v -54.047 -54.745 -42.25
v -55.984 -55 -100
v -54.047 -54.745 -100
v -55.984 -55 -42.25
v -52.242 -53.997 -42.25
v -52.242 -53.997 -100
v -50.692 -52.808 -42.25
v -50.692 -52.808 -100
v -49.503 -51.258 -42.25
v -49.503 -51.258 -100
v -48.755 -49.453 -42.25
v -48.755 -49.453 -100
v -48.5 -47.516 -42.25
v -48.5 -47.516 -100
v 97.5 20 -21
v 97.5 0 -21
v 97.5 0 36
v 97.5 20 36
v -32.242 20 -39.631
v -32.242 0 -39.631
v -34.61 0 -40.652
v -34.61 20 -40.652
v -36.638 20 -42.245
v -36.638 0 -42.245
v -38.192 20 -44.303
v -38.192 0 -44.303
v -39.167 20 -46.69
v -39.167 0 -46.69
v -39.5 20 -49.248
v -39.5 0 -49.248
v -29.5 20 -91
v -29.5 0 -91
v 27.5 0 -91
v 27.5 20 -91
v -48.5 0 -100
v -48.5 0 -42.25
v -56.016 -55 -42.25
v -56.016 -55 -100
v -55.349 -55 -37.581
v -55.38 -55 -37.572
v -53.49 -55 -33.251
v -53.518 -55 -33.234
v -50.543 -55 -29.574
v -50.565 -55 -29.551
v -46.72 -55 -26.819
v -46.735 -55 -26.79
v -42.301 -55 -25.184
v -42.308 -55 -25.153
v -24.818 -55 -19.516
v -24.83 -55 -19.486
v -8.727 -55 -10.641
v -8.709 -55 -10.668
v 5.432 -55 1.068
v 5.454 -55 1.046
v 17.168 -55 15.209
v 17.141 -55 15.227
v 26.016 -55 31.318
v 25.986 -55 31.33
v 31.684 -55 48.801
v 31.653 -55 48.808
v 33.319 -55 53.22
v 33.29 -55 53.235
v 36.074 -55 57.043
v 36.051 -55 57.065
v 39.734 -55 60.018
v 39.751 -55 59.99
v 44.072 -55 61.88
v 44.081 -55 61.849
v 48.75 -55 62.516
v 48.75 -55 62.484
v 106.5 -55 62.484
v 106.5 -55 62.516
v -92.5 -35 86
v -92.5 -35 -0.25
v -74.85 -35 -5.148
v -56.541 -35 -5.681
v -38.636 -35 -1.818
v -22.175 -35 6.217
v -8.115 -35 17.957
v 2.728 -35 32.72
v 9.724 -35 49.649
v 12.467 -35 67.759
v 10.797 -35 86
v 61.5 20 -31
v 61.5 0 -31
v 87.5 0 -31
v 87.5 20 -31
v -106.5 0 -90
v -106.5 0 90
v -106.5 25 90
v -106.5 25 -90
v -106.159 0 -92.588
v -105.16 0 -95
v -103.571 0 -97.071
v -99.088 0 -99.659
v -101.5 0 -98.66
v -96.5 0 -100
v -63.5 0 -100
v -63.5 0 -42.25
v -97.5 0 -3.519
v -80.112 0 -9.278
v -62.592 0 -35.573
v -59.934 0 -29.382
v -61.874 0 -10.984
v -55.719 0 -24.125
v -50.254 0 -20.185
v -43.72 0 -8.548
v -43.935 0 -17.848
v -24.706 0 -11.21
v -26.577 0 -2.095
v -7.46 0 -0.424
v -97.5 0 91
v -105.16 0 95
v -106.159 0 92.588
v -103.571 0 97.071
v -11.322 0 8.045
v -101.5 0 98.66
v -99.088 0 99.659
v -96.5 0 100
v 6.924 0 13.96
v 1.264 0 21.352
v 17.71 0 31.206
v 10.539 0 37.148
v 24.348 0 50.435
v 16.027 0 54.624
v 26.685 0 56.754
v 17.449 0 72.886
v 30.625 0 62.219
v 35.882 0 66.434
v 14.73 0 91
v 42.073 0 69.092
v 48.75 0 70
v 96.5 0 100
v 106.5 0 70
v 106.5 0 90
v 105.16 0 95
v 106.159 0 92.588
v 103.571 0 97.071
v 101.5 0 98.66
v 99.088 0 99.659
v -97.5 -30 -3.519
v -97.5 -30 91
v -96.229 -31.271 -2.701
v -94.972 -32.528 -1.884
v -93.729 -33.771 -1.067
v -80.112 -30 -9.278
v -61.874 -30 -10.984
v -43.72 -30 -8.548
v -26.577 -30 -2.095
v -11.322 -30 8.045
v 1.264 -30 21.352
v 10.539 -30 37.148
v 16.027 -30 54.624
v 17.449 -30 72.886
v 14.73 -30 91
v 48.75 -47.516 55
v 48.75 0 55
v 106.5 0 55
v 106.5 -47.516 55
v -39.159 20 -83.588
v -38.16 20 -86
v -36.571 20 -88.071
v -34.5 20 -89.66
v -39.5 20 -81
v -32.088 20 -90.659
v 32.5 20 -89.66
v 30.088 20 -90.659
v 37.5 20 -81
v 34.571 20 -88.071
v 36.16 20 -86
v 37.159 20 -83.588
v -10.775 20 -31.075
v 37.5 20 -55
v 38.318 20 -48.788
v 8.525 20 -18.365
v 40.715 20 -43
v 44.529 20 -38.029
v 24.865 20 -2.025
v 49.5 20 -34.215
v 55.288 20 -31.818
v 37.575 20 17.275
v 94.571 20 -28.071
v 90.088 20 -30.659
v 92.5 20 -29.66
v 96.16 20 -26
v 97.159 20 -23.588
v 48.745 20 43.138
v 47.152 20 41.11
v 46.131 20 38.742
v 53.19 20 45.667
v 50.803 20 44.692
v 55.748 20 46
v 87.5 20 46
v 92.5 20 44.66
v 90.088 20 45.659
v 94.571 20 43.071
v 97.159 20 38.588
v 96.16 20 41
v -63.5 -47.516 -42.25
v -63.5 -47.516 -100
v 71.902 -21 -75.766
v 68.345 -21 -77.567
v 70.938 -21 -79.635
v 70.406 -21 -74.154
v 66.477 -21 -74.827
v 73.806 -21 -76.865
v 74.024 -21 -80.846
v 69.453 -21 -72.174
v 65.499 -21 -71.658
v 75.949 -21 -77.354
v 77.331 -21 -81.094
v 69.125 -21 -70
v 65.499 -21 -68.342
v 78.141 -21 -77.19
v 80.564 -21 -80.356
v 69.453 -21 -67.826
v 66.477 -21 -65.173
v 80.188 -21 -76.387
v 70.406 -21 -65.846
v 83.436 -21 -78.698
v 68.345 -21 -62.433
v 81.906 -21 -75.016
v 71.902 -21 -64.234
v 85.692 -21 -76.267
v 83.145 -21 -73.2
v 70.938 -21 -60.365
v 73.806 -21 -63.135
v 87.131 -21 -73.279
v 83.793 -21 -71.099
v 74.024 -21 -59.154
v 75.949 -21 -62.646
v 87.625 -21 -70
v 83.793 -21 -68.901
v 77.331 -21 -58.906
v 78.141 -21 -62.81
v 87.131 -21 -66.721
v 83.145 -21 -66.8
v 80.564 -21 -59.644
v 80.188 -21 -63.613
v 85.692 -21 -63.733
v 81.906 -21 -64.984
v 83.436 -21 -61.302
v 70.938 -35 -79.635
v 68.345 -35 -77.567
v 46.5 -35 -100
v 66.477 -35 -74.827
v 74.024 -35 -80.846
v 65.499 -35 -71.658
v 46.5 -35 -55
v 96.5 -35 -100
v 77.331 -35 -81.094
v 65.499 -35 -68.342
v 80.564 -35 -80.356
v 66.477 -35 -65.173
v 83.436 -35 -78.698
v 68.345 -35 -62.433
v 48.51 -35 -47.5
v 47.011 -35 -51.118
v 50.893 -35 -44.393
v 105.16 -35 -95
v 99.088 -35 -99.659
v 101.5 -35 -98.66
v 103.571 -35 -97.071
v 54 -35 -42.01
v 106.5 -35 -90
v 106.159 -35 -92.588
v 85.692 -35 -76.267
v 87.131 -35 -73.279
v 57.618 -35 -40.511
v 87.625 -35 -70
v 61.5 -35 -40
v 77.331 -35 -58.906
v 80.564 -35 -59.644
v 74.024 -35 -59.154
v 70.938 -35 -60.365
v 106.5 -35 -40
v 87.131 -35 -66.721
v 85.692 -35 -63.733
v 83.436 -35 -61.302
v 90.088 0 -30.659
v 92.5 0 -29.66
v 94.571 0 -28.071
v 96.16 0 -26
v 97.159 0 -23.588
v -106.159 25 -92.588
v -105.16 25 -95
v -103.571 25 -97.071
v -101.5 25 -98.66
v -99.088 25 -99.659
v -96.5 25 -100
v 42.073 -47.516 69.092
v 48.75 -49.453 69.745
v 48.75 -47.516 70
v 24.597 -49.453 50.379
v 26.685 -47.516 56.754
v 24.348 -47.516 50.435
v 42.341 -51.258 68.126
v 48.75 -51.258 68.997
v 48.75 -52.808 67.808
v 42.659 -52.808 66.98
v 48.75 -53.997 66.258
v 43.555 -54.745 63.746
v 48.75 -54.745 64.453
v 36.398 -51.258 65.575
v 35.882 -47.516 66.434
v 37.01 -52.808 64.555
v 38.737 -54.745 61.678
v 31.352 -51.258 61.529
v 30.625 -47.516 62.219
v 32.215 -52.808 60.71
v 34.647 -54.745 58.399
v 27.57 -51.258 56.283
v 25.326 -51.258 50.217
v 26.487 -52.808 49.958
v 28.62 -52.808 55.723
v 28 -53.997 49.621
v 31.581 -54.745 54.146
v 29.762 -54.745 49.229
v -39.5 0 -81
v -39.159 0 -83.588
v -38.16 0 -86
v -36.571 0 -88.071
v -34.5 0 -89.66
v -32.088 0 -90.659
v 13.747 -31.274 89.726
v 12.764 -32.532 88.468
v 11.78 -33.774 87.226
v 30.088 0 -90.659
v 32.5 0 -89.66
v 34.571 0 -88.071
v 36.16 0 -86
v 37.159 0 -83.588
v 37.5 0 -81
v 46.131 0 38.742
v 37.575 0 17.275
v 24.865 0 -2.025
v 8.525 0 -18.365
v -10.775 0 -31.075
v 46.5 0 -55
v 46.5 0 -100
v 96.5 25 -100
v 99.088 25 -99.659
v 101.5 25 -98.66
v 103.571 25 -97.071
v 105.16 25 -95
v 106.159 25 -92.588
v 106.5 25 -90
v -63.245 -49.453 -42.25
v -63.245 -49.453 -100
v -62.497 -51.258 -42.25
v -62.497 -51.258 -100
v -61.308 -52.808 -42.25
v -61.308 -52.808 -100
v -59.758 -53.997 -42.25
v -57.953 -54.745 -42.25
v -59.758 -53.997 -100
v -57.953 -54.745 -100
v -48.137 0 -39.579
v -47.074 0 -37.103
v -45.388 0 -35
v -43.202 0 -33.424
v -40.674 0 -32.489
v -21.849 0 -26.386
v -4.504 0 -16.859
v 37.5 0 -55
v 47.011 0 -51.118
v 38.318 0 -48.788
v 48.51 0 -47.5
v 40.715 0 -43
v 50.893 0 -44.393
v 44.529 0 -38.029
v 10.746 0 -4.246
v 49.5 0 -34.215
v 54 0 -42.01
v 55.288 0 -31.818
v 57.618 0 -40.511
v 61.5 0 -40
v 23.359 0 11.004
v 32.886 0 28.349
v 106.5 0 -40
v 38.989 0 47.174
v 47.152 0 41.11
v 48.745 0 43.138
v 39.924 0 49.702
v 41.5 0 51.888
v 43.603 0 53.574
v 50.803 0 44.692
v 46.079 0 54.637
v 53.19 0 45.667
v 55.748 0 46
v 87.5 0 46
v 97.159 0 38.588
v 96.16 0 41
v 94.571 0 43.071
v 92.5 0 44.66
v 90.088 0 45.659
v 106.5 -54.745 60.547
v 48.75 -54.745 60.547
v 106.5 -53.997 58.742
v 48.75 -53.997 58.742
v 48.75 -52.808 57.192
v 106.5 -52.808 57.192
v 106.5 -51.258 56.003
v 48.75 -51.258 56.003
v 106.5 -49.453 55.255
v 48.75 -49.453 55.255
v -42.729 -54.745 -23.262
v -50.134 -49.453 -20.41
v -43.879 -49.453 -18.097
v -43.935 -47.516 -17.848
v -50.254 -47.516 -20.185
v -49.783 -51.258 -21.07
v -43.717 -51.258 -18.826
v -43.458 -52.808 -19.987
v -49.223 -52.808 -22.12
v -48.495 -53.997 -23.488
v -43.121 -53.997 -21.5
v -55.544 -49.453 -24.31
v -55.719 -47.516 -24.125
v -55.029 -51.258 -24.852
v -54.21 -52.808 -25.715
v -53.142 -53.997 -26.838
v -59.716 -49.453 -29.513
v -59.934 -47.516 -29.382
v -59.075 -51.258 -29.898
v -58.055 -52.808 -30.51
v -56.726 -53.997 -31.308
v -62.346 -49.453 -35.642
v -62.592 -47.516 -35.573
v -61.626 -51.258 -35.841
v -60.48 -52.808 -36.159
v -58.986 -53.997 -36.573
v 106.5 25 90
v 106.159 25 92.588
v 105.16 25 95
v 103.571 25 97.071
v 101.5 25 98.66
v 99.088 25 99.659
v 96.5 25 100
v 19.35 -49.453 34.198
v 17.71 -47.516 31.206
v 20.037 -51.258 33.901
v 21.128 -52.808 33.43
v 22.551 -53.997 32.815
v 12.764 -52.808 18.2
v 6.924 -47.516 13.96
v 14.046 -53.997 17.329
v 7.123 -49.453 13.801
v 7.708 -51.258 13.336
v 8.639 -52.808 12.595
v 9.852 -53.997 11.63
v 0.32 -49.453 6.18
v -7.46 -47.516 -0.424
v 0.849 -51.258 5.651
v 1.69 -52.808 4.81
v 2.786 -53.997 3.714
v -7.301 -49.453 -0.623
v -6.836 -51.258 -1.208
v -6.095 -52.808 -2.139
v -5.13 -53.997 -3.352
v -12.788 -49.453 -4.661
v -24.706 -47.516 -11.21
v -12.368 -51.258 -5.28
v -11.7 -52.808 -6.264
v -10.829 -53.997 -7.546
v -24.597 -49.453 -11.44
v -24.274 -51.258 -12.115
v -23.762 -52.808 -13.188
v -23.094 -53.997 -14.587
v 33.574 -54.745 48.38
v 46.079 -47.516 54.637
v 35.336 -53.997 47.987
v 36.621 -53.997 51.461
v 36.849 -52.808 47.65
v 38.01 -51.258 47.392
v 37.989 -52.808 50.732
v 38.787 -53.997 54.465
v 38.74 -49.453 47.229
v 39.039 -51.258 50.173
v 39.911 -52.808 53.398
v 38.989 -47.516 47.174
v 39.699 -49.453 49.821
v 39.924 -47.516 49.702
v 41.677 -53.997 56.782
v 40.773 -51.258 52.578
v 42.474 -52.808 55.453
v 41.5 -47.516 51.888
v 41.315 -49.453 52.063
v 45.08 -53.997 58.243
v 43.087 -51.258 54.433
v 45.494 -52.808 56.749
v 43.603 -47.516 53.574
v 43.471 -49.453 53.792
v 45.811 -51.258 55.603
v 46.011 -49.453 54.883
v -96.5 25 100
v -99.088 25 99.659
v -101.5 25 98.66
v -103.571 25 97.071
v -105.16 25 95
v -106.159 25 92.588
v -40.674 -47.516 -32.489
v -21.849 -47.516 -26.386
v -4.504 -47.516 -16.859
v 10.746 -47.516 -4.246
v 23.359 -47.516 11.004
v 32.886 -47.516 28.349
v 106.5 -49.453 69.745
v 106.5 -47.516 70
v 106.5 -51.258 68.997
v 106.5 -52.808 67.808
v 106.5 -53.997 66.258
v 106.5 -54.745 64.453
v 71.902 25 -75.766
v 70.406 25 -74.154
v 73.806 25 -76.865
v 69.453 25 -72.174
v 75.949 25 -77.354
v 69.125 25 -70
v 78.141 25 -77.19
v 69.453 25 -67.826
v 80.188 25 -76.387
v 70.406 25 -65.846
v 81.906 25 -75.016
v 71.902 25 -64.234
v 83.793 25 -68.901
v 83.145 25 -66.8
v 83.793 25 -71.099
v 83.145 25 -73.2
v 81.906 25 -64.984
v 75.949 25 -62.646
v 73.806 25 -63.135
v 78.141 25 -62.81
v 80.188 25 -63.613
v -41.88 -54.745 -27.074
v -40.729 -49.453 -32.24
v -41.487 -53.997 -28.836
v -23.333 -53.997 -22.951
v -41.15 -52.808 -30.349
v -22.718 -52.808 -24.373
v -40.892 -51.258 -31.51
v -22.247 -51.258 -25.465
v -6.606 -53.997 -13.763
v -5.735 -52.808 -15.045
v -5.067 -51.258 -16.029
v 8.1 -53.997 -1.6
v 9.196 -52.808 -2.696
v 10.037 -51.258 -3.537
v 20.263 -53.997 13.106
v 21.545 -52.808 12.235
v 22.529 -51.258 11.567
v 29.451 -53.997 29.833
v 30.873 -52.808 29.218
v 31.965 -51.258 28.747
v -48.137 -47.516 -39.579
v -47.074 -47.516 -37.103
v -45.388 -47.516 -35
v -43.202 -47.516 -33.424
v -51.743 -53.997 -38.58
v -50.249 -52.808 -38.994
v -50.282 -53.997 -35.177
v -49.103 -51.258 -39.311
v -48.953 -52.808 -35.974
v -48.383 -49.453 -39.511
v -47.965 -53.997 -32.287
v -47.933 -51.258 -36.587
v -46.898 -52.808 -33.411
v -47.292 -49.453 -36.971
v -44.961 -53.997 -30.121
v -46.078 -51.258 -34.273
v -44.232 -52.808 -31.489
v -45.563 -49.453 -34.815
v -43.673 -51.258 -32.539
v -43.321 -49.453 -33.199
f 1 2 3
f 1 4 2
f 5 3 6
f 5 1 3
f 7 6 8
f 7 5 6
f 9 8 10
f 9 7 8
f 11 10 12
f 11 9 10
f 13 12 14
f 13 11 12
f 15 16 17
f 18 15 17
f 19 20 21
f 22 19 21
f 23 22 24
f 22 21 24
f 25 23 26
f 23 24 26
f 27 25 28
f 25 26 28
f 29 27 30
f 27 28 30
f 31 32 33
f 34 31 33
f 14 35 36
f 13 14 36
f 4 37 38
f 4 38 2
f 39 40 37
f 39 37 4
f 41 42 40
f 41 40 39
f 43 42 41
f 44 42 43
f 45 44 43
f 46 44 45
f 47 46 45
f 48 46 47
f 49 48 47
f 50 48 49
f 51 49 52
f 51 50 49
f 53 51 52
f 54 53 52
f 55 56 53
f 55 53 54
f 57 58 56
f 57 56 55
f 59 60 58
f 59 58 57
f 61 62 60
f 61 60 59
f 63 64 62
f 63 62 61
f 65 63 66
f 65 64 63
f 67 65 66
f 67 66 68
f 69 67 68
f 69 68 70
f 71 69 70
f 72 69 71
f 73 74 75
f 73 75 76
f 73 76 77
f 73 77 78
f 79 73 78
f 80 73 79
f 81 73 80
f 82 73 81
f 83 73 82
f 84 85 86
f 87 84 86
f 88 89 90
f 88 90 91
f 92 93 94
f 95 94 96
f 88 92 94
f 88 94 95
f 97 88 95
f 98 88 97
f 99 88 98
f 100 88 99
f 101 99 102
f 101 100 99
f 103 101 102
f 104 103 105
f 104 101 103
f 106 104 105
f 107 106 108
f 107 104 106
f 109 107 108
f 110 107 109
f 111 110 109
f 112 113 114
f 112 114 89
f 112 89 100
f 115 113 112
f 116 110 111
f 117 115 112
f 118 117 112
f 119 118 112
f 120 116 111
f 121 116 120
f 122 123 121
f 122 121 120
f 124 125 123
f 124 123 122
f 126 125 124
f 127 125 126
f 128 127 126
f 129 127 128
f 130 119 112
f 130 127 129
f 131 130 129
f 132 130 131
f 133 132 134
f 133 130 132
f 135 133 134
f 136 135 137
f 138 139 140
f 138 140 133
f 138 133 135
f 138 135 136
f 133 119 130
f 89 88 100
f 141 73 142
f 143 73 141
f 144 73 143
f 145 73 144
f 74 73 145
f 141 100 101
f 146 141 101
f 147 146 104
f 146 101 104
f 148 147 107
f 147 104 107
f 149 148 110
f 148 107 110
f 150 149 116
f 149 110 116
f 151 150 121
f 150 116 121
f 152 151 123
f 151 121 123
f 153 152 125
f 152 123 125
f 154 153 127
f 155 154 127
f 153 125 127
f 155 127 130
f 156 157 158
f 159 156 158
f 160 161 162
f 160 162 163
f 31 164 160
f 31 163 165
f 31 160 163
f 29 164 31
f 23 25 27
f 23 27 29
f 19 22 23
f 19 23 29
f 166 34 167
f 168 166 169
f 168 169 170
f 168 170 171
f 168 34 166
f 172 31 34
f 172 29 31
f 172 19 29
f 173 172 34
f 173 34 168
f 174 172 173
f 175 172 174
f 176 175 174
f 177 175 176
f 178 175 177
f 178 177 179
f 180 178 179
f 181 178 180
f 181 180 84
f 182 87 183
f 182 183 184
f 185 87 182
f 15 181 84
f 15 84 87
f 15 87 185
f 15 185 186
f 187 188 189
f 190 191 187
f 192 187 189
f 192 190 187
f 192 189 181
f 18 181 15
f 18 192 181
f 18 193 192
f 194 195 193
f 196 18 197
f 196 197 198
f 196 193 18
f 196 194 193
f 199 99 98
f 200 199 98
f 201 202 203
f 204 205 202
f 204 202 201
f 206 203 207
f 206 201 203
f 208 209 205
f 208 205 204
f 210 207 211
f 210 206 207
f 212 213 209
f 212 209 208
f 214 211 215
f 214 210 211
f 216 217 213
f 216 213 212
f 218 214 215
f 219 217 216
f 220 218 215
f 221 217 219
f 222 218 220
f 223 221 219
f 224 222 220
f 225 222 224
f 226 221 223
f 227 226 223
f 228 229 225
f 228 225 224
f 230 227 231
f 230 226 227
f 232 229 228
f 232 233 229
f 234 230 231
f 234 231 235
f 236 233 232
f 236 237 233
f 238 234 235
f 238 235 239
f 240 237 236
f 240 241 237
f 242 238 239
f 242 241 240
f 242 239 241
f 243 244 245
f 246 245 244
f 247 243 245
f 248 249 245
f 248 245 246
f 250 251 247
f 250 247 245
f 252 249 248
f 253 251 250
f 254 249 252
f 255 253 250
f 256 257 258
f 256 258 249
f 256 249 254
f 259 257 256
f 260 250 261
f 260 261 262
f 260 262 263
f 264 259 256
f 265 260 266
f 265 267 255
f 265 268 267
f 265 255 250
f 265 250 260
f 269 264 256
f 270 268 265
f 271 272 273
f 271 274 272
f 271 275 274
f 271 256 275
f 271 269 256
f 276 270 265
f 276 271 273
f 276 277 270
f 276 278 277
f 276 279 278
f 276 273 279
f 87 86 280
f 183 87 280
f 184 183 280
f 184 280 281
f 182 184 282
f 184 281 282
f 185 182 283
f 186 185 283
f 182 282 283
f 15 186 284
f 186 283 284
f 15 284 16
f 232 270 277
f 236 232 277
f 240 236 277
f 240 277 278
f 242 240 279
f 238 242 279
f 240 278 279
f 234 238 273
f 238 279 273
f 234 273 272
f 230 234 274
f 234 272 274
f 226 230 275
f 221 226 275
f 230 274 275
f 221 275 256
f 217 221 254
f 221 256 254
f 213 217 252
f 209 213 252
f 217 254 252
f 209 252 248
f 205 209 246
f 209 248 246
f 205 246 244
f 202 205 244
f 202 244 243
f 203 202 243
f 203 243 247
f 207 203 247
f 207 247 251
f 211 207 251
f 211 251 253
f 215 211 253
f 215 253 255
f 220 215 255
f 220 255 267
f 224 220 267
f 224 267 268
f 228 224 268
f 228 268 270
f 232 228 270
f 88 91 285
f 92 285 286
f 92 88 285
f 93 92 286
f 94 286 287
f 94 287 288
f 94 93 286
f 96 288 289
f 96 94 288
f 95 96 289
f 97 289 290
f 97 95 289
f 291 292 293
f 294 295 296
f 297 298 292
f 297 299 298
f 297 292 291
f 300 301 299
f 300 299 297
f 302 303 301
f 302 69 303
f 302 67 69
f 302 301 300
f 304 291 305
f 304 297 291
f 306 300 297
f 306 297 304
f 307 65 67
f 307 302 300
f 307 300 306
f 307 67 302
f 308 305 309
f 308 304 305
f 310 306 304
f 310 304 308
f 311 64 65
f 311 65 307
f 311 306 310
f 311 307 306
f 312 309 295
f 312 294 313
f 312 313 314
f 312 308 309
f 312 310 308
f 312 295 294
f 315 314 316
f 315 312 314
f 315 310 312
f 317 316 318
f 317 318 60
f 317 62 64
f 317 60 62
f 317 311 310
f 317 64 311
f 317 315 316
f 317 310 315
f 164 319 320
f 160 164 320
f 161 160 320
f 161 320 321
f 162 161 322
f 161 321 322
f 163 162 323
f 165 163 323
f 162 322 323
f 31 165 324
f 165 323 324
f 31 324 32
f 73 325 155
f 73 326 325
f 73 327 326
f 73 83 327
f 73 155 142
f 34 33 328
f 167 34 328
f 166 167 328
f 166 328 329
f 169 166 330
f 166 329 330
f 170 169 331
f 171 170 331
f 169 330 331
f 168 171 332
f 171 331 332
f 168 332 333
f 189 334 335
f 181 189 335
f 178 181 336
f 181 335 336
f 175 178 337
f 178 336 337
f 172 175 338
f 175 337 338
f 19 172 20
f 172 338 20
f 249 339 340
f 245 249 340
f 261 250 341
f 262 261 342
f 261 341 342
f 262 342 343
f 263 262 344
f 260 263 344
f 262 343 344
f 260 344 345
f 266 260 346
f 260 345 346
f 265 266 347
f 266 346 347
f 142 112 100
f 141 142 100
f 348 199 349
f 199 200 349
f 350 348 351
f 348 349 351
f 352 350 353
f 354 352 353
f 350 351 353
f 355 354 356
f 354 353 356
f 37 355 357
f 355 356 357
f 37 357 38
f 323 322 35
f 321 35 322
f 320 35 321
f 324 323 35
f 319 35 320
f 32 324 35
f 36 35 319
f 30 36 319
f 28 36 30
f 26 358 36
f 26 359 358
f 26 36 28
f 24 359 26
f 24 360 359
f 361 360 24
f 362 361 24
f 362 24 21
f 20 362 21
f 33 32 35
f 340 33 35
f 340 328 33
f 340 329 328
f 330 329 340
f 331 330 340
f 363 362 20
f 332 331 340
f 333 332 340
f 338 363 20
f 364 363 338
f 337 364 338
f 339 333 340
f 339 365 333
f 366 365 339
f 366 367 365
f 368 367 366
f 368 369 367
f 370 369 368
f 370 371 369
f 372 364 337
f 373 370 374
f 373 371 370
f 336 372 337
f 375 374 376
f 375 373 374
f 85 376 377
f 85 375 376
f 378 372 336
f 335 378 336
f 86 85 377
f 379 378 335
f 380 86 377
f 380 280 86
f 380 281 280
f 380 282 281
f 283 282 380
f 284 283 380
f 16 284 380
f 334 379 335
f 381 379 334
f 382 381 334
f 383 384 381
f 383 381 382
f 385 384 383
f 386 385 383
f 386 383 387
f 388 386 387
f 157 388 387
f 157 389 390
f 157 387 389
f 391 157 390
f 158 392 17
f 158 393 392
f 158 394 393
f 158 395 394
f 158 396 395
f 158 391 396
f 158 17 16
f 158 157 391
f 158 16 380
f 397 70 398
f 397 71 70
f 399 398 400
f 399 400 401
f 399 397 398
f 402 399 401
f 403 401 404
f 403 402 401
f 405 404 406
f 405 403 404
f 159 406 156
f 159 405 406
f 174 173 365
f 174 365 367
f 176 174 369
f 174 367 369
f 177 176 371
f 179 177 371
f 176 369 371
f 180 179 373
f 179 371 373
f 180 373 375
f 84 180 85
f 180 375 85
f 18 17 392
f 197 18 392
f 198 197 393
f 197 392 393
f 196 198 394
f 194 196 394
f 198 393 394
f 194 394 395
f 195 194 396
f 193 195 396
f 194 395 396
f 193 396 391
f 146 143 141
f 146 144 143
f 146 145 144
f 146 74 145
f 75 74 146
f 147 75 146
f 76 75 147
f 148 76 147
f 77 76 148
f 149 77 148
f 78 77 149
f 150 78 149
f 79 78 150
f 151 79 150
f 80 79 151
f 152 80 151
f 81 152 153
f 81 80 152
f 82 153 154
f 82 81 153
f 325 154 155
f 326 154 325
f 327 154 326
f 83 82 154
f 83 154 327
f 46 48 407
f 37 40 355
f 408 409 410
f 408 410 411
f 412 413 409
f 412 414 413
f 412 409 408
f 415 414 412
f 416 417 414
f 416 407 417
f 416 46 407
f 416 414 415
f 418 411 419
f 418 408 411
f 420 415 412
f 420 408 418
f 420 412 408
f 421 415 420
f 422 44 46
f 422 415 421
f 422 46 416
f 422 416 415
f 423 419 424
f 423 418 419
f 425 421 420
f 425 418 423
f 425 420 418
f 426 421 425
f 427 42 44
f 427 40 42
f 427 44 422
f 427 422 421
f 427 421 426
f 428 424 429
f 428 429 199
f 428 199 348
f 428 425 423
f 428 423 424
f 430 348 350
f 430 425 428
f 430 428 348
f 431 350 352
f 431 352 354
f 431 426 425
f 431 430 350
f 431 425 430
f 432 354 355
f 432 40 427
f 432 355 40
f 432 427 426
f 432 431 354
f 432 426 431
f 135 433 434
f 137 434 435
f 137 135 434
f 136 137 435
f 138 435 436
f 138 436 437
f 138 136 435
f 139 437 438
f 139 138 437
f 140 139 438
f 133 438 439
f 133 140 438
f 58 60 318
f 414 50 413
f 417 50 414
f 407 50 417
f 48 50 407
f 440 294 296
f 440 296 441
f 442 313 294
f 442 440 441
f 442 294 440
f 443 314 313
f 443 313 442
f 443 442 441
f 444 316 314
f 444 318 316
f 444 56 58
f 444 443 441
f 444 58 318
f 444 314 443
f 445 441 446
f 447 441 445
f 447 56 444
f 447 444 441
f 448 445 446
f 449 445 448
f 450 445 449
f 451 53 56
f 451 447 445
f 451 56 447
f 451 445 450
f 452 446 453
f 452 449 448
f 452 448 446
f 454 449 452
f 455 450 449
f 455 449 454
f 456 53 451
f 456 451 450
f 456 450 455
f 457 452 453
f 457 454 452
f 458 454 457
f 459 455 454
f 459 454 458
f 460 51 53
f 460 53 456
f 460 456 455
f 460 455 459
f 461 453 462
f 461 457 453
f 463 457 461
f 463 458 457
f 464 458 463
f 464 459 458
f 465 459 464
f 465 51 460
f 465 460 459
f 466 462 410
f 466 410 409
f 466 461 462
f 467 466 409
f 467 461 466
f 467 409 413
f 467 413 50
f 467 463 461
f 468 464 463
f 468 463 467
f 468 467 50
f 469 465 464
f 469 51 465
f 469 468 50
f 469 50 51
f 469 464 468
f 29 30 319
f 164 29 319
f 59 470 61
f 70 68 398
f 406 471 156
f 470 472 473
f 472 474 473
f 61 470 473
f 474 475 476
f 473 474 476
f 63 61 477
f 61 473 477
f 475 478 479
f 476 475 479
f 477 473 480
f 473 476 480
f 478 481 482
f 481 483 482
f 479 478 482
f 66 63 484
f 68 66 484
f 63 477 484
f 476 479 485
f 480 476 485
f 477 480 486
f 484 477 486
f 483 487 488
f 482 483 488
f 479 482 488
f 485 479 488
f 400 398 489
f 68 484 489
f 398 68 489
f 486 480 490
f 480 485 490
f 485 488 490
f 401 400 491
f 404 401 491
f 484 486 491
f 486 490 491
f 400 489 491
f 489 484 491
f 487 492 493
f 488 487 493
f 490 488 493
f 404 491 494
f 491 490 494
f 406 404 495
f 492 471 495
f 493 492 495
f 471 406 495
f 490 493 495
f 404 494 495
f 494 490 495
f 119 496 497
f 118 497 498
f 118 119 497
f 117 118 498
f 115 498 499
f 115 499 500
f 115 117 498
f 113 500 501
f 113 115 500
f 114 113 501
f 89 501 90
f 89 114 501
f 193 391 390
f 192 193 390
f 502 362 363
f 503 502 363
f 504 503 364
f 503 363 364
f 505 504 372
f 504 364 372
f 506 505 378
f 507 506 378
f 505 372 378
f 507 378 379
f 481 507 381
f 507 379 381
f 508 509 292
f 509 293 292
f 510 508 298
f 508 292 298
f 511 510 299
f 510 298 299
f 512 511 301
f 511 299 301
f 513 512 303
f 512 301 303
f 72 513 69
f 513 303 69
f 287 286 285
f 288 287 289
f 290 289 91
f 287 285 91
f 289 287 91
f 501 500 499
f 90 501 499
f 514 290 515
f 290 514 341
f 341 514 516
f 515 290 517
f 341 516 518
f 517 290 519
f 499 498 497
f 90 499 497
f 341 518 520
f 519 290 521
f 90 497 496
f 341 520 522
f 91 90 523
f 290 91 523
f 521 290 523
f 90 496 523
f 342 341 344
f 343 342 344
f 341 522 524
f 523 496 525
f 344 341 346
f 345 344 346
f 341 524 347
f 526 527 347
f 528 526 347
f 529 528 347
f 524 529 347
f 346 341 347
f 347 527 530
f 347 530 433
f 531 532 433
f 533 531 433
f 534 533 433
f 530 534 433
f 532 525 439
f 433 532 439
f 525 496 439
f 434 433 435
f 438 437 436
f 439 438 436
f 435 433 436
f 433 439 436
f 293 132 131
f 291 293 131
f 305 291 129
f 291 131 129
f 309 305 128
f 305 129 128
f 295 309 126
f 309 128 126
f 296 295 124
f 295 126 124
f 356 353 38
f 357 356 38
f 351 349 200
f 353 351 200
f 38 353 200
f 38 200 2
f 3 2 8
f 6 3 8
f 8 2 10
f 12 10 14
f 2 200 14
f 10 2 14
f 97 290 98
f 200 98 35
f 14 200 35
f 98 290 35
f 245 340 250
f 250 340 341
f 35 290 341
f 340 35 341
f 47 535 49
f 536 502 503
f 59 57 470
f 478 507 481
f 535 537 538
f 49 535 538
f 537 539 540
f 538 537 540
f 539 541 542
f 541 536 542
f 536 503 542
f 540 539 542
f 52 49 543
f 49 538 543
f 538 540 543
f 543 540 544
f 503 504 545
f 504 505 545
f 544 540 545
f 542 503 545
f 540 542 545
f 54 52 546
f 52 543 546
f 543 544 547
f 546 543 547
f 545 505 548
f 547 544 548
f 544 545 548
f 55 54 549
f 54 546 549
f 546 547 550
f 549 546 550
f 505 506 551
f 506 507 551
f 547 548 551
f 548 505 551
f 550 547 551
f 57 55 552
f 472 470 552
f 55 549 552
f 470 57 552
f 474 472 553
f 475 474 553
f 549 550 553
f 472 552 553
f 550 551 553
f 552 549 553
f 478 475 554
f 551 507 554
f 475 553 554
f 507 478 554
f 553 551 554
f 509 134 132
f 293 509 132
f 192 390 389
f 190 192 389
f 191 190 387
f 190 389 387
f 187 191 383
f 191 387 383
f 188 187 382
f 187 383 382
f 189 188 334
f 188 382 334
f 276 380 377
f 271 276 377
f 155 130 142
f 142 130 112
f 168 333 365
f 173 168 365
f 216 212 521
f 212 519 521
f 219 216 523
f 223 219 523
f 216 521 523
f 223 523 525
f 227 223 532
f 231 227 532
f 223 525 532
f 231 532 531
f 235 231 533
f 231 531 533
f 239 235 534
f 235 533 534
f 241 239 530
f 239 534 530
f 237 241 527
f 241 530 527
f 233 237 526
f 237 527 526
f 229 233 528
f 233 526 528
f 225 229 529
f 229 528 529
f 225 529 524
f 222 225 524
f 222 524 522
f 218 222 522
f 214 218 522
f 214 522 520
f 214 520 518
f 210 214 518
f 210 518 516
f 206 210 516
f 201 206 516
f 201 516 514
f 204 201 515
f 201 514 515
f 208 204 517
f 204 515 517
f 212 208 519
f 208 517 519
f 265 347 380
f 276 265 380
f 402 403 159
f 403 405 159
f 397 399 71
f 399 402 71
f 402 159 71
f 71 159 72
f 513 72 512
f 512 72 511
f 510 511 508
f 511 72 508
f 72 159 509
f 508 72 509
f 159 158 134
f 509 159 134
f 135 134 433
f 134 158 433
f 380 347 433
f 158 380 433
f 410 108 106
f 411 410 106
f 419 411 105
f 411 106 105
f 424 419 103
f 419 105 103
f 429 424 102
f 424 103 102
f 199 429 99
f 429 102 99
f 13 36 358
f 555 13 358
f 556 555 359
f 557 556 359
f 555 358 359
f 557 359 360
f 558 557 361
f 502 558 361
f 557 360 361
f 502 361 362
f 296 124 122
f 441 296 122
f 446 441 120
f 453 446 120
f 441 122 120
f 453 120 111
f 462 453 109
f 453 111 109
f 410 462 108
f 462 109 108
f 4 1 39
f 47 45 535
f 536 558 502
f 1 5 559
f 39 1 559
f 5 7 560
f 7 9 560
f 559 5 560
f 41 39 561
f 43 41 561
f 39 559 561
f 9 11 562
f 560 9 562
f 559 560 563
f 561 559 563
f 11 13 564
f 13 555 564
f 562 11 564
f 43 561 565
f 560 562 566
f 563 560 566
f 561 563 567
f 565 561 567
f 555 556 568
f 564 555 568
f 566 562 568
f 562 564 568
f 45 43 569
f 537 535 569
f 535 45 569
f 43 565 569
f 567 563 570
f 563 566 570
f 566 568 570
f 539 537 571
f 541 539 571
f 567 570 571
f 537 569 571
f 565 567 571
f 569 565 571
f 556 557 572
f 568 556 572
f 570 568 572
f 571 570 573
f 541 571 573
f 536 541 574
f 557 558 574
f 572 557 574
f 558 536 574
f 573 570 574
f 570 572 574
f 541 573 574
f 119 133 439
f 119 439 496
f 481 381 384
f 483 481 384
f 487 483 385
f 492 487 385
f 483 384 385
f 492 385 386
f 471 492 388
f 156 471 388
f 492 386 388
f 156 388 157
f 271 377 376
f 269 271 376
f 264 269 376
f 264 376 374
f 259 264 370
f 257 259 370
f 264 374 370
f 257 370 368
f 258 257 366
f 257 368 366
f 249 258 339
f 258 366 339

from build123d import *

# Parameters (mm, degrees)
F1_DEPTH       = 25
F2_DEPTH       = 35
F3_DEPTH       = 55
F4_DEPTH       = 20
F5_SIZE2       = 5
F5_SIZE        = 5
F7_D           = 14.75
F7_CBORE_D     = 22.25
F7_CBORE_DEPTH = 14
F8_R           = 7.4840620434


with BuildPart() as f1:
    # F0 (on Front) → F1 (new body)
    with BuildSketch(Plane.XZ):
        with BuildLine():
            Line((106.5, -40), (106.5, 55))
            Line((106.5, 55), (48.7497216032, 55))
            ThreePointArc((48.7497216032, 55), (42.4942891815, 52.8018949761), (38.9888762464, 47.1739130435))
            ThreePointArc((38.9888762464, 47.1739130435), (10.7462120246, -4.2462120246), (-40.6739130435, -32.4888762464))
            ThreePointArc((-40.6739130435, -32.4888762464), (-46.3018949761, -35.9942891815), (-48.5, -42.2497216032))
            Line((-48.5, -42.2497216032), (-48.5, -100))
            Line((-48.5, -100), (46.5, -100))
            Line((46.5, -100), (46.5, -55))
            ThreePointArc((46.5, -55), (50.8933982822, -44.3933982822), (61.5, -40))
            Line((61.5, -40), (106.5, -40))
        make_face()
        with BuildLine():
            ThreePointArc((-29.5, -91), (-36.5710678119, -88.0710678119), (-39.5, -81))
            Line((-39.5, -81), (-39.5, -49.2476414861))
            ThreePointArc((-39.5, -49.2476414861), (-37.481834214, -43.2234965193), (-32.2419354839, -39.630896205))
            ThreePointArc((-32.2419354839, -39.630896205), (17.1101730553, -10.6101730553), (46.130896205, 38.7419354839))
            ThreePointArc((46.130896205, 38.7419354839), (49.7234965193, 43.981834214), (55.7476414861, 46))
            Line((55.7476414861, 46), (87.5, 46))
            ThreePointArc((87.5, 46), (94.5710678119, 43.0710678119), (97.5, 36))
            Line((97.5, 36), (97.5, -21))
            ThreePointArc((97.5, -21), (94.5710678119, -28.0710678119), (87.5, -31))
            Line((87.5, -31), (61.5, -31))
            ThreePointArc((61.5, -31), (44.5294372515, -38.0294372515), (37.5, -55))
            Line((37.5, -55), (37.5, -81))
            ThreePointArc((37.5, -81), (34.5710678119, -88.0710678119), (27.5, -91))
            Line((27.5, -91), (-29.5, -91))
        make_face(mode=Mode.SUBTRACT)
        with BuildLine():
            Line((96.5, 100), (-96.5, 100))
            ThreePointArc((-96.5, 100), (-103.5710678119, 97.0710678119), (-106.5, 90))
            Line((-106.5, 90), (-106.5, -90))
            ThreePointArc((-106.5, -90), (-103.5710678119, -97.0710678119), (-96.5, -100))
            Line((-96.5, -100), (-63.5, -100))
            Line((-63.5, -100), (-63.5, -42.2497216032))
            ThreePointArc((-63.5, -42.2497216032), (-58.0047374401, -26.6111405489), (-43.9347826087, -17.8476082112))
            ThreePointArc((-43.9347826087, -17.8476082112), (0.1396103068, 6.3603896932), (24.3476082112, 50.4347826087))
            ThreePointArc((24.3476082112, 50.4347826087), (33.1111405489, 64.5047374401), (48.7497216032, 70))
            Line((48.7497216032, 70), (106.5, 70))
            Line((106.5, 70), (106.5, 90))
            ThreePointArc((106.5, 90), (103.5710678119, 97.0710678119), (96.5, 100))
        make_face()
        with BuildLine():
            ThreePointArc((14.7304288624, 91), (-11.3221396288, 8.044605666), (-97.5, -3.5187051029))
            Line((-97.5, -3.5187051029), (-97.5, 91))
            Line((-97.5, 91), (14.7304288624, 91))
        make_face(mode=Mode.SUBTRACT)
        with BuildLine():
            Line((-97.5, 91), (-97.5, -3.5187051029))
            ThreePointArc((-97.5, -3.5187051029), (-11.3221396288, 8.044605666), (14.7304288624, 91))
            Line((14.7304288624, 91), (-97.5, 91))
        make_face()
        with BuildLine():
            Line((-39.5, -49.2476414861), (-39.5, -81))
            ThreePointArc((-39.5, -81), (-36.5710678119, -88.0710678119), (-29.5, -91))
            Line((-29.5, -91), (27.5, -91))
            ThreePointArc((27.5, -91), (34.5710678119, -88.0710678119), (37.5, -81))
            Line((37.5, -81), (37.5, -55))
            ThreePointArc((37.5, -55), (44.5294372515, -38.0294372515), (61.5, -31))
            Line((61.5, -31), (87.5, -31))
            ThreePointArc((87.5, -31), (94.5710678119, -28.0710678119), (97.5, -21))
            Line((97.5, -21), (97.5, 36))
            ThreePointArc((97.5, 36), (94.5710678119, 43.0710678119), (87.5, 46))
            Line((87.5, 46), (55.7476414861, 46))
            ThreePointArc((55.7476414861, 46), (49.7234965193, 43.981834214), (46.130896205, 38.7419354839))
            ThreePointArc((46.130896205, 38.7419354839), (17.1101730553, -10.6101730553), (-32.2419354839, -39.630896205))
            ThreePointArc((-32.2419354839, -39.630896205), (-37.481834214, -43.2234965193), (-39.5, -49.2476414861))
        make_face()
        with BuildLine():
            Line((106.5, 55), (106.5, 70))
            Line((106.5, 70), (48.7497216032, 70))
            ThreePointArc((48.7497216032, 70), (33.1111405489, 64.5047374401), (24.3476082112, 50.4347826087))
            ThreePointArc((24.3476082112, 50.4347826087), (0.1396103068, 6.3603896932), (-43.9347826087, -17.8476082112))
            ThreePointArc((-43.9347826087, -17.8476082112), (-58.0047374401, -26.6111405489), (-63.5, -42.2497216032))
            Line((-63.5, -42.2497216032), (-63.5, -100))
            Line((-63.5, -100), (-48.5, -100))
            Line((-48.5, -100), (-48.5, -42.2497216032))
            ThreePointArc((-48.5, -42.2497216032), (-46.3018949761, -35.9942891815), (-40.6739130435, -32.4888762464))
            ThreePointArc((-40.6739130435, -32.4888762464), (10.7462120246, -4.2462120246), (38.9888762464, 47.1739130435))
            ThreePointArc((38.9888762464, 47.1739130435), (42.4942891815, 52.8018949761), (48.7497216032, 55))
            Line((48.7497216032, 55), (106.5, 55))
        make_face()
        with BuildLine():
            Line((106.5, -90), (106.5, -40))
            Line((106.5, -40), (61.5, -40))
            ThreePointArc((61.5, -40), (50.8933982822, -44.3933982822), (46.5, -55))
            Line((46.5, -55), (46.5, -100))
            Line((46.5, -100), (96.5, -100))
            ThreePointArc((96.5, -100), (103.5710678119, -97.0710678119), (106.5, -90))
        make_face()
    extrude(amount=-F1_DEPTH)

    # F0 (on Front) → F2 (join)
    with BuildSketch(Plane.XZ):
        with BuildLine():
            Line((-97.5, 91), (-97.5, -3.5187051029))
            ThreePointArc((-97.5, -3.5187051029), (-11.3221396288, 8.044605666), (14.7304288624, 91))
            Line((14.7304288624, 91), (-97.5, 91))
        make_face()
        with BuildLine():
            Line((106.5, -90), (106.5, -40))
            Line((106.5, -40), (61.5, -40))
            ThreePointArc((61.5, -40), (50.8933982822, -44.3933982822), (46.5, -55))
            Line((46.5, -55), (46.5, -100))
            Line((46.5, -100), (96.5, -100))
            ThreePointArc((96.5, -100), (103.5710678119, -97.0710678119), (106.5, -90))
        make_face()
    extrude(amount=F2_DEPTH)

    # F0 (on Front) → F3 (join)
    with BuildSketch(Plane.XZ):
        with BuildLine():
            Line((106.5, 55), (106.5, 70))
            Line((106.5, 70), (48.7497216032, 70))
            ThreePointArc((48.7497216032, 70), (33.1111405489, 64.5047374401), (24.3476082112, 50.4347826087))
            ThreePointArc((24.3476082112, 50.4347826087), (0.1396103068, 6.3603896932), (-43.9347826087, -17.8476082112))
            ThreePointArc((-43.9347826087, -17.8476082112), (-58.0047374401, -26.6111405489), (-63.5, -42.2497216032))
            Line((-63.5, -42.2497216032), (-63.5, -100))
            Line((-63.5, -100), (-48.5, -100))
            Line((-48.5, -100), (-48.5, -42.2497216032))
            ThreePointArc((-48.5, -42.2497216032), (-46.3018949761, -35.9942891815), (-40.6739130435, -32.4888762464))
            ThreePointArc((-40.6739130435, -32.4888762464), (10.7462120246, -4.2462120246), (38.9888762464, 47.1739130435))
            ThreePointArc((38.9888762464, 47.1739130435), (42.4942891815, 52.8018949761), (48.7497216032, 55))
            Line((48.7497216032, 55), (106.5, 55))
        make_face()
    extrude(amount=F3_DEPTH)

    # F0 (on Front) → F4 (cut)
    with BuildSketch(Plane.XZ):
        with BuildLine():
            Line((-39.5, -49.2476414861), (-39.5, -81))
            ThreePointArc((-39.5, -81), (-36.5710678119, -88.0710678119), (-29.5, -91))
            Line((-29.5, -91), (27.5, -91))
            ThreePointArc((27.5, -91), (34.5710678119, -88.0710678119), (37.5, -81))
            Line((37.5, -81), (37.5, -55))
            ThreePointArc((37.5, -55), (44.5294372515, -38.0294372515), (61.5, -31))
            Line((61.5, -31), (87.5, -31))
            ThreePointArc((87.5, -31), (94.5710678119, -28.0710678119), (97.5, -21))
            Line((97.5, -21), (97.5, 36))
            ThreePointArc((97.5, 36), (94.5710678119, 43.0710678119), (87.5, 46))
            Line((87.5, 46), (55.7476414861, 46))
            ThreePointArc((55.7476414861, 46), (49.7234965193, 43.981834214), (46.130896205, 38.7419354839))
            ThreePointArc((46.130896205, 38.7419354839), (17.1101730553, -10.6101730553), (-32.2419354839, -39.630896205))
            ThreePointArc((-32.2419354839, -39.630896205), (-37.481834214, -43.2234965193), (-39.5, -49.2476414861))
        make_face()
    extrude(amount=-F4_DEPTH, mode=Mode.SUBTRACT)

    # F5
    f5_edges = [f1.edges().sort_by_distance(p)[0] for p in [
        (-11.32214, -35, 8.044606),
        (-41.384786, -35, 91),
        (-97.5, -35, 43.740647),
    ]]
    chamfer(f5_edges, length=F5_SIZE, length2=F5_SIZE2)

    # F7 (through all)
    with Locations(Plane.XZ.offset(35)):
        with Locations((76.5, -70)):
            CounterBoreHole(F7_D / 2, F7_CBORE_D / 2, F7_CBORE_DEPTH)

    # F8
    f8_edges = [f1.edges().sort_by_distance(p)[0] for p in [
        (-48.5, -55, -71.124861),
        (-63.5, -55, -71.124861),
    ]]
    fillet(f8_edges, radius=F8_R)


solid = f1.part
